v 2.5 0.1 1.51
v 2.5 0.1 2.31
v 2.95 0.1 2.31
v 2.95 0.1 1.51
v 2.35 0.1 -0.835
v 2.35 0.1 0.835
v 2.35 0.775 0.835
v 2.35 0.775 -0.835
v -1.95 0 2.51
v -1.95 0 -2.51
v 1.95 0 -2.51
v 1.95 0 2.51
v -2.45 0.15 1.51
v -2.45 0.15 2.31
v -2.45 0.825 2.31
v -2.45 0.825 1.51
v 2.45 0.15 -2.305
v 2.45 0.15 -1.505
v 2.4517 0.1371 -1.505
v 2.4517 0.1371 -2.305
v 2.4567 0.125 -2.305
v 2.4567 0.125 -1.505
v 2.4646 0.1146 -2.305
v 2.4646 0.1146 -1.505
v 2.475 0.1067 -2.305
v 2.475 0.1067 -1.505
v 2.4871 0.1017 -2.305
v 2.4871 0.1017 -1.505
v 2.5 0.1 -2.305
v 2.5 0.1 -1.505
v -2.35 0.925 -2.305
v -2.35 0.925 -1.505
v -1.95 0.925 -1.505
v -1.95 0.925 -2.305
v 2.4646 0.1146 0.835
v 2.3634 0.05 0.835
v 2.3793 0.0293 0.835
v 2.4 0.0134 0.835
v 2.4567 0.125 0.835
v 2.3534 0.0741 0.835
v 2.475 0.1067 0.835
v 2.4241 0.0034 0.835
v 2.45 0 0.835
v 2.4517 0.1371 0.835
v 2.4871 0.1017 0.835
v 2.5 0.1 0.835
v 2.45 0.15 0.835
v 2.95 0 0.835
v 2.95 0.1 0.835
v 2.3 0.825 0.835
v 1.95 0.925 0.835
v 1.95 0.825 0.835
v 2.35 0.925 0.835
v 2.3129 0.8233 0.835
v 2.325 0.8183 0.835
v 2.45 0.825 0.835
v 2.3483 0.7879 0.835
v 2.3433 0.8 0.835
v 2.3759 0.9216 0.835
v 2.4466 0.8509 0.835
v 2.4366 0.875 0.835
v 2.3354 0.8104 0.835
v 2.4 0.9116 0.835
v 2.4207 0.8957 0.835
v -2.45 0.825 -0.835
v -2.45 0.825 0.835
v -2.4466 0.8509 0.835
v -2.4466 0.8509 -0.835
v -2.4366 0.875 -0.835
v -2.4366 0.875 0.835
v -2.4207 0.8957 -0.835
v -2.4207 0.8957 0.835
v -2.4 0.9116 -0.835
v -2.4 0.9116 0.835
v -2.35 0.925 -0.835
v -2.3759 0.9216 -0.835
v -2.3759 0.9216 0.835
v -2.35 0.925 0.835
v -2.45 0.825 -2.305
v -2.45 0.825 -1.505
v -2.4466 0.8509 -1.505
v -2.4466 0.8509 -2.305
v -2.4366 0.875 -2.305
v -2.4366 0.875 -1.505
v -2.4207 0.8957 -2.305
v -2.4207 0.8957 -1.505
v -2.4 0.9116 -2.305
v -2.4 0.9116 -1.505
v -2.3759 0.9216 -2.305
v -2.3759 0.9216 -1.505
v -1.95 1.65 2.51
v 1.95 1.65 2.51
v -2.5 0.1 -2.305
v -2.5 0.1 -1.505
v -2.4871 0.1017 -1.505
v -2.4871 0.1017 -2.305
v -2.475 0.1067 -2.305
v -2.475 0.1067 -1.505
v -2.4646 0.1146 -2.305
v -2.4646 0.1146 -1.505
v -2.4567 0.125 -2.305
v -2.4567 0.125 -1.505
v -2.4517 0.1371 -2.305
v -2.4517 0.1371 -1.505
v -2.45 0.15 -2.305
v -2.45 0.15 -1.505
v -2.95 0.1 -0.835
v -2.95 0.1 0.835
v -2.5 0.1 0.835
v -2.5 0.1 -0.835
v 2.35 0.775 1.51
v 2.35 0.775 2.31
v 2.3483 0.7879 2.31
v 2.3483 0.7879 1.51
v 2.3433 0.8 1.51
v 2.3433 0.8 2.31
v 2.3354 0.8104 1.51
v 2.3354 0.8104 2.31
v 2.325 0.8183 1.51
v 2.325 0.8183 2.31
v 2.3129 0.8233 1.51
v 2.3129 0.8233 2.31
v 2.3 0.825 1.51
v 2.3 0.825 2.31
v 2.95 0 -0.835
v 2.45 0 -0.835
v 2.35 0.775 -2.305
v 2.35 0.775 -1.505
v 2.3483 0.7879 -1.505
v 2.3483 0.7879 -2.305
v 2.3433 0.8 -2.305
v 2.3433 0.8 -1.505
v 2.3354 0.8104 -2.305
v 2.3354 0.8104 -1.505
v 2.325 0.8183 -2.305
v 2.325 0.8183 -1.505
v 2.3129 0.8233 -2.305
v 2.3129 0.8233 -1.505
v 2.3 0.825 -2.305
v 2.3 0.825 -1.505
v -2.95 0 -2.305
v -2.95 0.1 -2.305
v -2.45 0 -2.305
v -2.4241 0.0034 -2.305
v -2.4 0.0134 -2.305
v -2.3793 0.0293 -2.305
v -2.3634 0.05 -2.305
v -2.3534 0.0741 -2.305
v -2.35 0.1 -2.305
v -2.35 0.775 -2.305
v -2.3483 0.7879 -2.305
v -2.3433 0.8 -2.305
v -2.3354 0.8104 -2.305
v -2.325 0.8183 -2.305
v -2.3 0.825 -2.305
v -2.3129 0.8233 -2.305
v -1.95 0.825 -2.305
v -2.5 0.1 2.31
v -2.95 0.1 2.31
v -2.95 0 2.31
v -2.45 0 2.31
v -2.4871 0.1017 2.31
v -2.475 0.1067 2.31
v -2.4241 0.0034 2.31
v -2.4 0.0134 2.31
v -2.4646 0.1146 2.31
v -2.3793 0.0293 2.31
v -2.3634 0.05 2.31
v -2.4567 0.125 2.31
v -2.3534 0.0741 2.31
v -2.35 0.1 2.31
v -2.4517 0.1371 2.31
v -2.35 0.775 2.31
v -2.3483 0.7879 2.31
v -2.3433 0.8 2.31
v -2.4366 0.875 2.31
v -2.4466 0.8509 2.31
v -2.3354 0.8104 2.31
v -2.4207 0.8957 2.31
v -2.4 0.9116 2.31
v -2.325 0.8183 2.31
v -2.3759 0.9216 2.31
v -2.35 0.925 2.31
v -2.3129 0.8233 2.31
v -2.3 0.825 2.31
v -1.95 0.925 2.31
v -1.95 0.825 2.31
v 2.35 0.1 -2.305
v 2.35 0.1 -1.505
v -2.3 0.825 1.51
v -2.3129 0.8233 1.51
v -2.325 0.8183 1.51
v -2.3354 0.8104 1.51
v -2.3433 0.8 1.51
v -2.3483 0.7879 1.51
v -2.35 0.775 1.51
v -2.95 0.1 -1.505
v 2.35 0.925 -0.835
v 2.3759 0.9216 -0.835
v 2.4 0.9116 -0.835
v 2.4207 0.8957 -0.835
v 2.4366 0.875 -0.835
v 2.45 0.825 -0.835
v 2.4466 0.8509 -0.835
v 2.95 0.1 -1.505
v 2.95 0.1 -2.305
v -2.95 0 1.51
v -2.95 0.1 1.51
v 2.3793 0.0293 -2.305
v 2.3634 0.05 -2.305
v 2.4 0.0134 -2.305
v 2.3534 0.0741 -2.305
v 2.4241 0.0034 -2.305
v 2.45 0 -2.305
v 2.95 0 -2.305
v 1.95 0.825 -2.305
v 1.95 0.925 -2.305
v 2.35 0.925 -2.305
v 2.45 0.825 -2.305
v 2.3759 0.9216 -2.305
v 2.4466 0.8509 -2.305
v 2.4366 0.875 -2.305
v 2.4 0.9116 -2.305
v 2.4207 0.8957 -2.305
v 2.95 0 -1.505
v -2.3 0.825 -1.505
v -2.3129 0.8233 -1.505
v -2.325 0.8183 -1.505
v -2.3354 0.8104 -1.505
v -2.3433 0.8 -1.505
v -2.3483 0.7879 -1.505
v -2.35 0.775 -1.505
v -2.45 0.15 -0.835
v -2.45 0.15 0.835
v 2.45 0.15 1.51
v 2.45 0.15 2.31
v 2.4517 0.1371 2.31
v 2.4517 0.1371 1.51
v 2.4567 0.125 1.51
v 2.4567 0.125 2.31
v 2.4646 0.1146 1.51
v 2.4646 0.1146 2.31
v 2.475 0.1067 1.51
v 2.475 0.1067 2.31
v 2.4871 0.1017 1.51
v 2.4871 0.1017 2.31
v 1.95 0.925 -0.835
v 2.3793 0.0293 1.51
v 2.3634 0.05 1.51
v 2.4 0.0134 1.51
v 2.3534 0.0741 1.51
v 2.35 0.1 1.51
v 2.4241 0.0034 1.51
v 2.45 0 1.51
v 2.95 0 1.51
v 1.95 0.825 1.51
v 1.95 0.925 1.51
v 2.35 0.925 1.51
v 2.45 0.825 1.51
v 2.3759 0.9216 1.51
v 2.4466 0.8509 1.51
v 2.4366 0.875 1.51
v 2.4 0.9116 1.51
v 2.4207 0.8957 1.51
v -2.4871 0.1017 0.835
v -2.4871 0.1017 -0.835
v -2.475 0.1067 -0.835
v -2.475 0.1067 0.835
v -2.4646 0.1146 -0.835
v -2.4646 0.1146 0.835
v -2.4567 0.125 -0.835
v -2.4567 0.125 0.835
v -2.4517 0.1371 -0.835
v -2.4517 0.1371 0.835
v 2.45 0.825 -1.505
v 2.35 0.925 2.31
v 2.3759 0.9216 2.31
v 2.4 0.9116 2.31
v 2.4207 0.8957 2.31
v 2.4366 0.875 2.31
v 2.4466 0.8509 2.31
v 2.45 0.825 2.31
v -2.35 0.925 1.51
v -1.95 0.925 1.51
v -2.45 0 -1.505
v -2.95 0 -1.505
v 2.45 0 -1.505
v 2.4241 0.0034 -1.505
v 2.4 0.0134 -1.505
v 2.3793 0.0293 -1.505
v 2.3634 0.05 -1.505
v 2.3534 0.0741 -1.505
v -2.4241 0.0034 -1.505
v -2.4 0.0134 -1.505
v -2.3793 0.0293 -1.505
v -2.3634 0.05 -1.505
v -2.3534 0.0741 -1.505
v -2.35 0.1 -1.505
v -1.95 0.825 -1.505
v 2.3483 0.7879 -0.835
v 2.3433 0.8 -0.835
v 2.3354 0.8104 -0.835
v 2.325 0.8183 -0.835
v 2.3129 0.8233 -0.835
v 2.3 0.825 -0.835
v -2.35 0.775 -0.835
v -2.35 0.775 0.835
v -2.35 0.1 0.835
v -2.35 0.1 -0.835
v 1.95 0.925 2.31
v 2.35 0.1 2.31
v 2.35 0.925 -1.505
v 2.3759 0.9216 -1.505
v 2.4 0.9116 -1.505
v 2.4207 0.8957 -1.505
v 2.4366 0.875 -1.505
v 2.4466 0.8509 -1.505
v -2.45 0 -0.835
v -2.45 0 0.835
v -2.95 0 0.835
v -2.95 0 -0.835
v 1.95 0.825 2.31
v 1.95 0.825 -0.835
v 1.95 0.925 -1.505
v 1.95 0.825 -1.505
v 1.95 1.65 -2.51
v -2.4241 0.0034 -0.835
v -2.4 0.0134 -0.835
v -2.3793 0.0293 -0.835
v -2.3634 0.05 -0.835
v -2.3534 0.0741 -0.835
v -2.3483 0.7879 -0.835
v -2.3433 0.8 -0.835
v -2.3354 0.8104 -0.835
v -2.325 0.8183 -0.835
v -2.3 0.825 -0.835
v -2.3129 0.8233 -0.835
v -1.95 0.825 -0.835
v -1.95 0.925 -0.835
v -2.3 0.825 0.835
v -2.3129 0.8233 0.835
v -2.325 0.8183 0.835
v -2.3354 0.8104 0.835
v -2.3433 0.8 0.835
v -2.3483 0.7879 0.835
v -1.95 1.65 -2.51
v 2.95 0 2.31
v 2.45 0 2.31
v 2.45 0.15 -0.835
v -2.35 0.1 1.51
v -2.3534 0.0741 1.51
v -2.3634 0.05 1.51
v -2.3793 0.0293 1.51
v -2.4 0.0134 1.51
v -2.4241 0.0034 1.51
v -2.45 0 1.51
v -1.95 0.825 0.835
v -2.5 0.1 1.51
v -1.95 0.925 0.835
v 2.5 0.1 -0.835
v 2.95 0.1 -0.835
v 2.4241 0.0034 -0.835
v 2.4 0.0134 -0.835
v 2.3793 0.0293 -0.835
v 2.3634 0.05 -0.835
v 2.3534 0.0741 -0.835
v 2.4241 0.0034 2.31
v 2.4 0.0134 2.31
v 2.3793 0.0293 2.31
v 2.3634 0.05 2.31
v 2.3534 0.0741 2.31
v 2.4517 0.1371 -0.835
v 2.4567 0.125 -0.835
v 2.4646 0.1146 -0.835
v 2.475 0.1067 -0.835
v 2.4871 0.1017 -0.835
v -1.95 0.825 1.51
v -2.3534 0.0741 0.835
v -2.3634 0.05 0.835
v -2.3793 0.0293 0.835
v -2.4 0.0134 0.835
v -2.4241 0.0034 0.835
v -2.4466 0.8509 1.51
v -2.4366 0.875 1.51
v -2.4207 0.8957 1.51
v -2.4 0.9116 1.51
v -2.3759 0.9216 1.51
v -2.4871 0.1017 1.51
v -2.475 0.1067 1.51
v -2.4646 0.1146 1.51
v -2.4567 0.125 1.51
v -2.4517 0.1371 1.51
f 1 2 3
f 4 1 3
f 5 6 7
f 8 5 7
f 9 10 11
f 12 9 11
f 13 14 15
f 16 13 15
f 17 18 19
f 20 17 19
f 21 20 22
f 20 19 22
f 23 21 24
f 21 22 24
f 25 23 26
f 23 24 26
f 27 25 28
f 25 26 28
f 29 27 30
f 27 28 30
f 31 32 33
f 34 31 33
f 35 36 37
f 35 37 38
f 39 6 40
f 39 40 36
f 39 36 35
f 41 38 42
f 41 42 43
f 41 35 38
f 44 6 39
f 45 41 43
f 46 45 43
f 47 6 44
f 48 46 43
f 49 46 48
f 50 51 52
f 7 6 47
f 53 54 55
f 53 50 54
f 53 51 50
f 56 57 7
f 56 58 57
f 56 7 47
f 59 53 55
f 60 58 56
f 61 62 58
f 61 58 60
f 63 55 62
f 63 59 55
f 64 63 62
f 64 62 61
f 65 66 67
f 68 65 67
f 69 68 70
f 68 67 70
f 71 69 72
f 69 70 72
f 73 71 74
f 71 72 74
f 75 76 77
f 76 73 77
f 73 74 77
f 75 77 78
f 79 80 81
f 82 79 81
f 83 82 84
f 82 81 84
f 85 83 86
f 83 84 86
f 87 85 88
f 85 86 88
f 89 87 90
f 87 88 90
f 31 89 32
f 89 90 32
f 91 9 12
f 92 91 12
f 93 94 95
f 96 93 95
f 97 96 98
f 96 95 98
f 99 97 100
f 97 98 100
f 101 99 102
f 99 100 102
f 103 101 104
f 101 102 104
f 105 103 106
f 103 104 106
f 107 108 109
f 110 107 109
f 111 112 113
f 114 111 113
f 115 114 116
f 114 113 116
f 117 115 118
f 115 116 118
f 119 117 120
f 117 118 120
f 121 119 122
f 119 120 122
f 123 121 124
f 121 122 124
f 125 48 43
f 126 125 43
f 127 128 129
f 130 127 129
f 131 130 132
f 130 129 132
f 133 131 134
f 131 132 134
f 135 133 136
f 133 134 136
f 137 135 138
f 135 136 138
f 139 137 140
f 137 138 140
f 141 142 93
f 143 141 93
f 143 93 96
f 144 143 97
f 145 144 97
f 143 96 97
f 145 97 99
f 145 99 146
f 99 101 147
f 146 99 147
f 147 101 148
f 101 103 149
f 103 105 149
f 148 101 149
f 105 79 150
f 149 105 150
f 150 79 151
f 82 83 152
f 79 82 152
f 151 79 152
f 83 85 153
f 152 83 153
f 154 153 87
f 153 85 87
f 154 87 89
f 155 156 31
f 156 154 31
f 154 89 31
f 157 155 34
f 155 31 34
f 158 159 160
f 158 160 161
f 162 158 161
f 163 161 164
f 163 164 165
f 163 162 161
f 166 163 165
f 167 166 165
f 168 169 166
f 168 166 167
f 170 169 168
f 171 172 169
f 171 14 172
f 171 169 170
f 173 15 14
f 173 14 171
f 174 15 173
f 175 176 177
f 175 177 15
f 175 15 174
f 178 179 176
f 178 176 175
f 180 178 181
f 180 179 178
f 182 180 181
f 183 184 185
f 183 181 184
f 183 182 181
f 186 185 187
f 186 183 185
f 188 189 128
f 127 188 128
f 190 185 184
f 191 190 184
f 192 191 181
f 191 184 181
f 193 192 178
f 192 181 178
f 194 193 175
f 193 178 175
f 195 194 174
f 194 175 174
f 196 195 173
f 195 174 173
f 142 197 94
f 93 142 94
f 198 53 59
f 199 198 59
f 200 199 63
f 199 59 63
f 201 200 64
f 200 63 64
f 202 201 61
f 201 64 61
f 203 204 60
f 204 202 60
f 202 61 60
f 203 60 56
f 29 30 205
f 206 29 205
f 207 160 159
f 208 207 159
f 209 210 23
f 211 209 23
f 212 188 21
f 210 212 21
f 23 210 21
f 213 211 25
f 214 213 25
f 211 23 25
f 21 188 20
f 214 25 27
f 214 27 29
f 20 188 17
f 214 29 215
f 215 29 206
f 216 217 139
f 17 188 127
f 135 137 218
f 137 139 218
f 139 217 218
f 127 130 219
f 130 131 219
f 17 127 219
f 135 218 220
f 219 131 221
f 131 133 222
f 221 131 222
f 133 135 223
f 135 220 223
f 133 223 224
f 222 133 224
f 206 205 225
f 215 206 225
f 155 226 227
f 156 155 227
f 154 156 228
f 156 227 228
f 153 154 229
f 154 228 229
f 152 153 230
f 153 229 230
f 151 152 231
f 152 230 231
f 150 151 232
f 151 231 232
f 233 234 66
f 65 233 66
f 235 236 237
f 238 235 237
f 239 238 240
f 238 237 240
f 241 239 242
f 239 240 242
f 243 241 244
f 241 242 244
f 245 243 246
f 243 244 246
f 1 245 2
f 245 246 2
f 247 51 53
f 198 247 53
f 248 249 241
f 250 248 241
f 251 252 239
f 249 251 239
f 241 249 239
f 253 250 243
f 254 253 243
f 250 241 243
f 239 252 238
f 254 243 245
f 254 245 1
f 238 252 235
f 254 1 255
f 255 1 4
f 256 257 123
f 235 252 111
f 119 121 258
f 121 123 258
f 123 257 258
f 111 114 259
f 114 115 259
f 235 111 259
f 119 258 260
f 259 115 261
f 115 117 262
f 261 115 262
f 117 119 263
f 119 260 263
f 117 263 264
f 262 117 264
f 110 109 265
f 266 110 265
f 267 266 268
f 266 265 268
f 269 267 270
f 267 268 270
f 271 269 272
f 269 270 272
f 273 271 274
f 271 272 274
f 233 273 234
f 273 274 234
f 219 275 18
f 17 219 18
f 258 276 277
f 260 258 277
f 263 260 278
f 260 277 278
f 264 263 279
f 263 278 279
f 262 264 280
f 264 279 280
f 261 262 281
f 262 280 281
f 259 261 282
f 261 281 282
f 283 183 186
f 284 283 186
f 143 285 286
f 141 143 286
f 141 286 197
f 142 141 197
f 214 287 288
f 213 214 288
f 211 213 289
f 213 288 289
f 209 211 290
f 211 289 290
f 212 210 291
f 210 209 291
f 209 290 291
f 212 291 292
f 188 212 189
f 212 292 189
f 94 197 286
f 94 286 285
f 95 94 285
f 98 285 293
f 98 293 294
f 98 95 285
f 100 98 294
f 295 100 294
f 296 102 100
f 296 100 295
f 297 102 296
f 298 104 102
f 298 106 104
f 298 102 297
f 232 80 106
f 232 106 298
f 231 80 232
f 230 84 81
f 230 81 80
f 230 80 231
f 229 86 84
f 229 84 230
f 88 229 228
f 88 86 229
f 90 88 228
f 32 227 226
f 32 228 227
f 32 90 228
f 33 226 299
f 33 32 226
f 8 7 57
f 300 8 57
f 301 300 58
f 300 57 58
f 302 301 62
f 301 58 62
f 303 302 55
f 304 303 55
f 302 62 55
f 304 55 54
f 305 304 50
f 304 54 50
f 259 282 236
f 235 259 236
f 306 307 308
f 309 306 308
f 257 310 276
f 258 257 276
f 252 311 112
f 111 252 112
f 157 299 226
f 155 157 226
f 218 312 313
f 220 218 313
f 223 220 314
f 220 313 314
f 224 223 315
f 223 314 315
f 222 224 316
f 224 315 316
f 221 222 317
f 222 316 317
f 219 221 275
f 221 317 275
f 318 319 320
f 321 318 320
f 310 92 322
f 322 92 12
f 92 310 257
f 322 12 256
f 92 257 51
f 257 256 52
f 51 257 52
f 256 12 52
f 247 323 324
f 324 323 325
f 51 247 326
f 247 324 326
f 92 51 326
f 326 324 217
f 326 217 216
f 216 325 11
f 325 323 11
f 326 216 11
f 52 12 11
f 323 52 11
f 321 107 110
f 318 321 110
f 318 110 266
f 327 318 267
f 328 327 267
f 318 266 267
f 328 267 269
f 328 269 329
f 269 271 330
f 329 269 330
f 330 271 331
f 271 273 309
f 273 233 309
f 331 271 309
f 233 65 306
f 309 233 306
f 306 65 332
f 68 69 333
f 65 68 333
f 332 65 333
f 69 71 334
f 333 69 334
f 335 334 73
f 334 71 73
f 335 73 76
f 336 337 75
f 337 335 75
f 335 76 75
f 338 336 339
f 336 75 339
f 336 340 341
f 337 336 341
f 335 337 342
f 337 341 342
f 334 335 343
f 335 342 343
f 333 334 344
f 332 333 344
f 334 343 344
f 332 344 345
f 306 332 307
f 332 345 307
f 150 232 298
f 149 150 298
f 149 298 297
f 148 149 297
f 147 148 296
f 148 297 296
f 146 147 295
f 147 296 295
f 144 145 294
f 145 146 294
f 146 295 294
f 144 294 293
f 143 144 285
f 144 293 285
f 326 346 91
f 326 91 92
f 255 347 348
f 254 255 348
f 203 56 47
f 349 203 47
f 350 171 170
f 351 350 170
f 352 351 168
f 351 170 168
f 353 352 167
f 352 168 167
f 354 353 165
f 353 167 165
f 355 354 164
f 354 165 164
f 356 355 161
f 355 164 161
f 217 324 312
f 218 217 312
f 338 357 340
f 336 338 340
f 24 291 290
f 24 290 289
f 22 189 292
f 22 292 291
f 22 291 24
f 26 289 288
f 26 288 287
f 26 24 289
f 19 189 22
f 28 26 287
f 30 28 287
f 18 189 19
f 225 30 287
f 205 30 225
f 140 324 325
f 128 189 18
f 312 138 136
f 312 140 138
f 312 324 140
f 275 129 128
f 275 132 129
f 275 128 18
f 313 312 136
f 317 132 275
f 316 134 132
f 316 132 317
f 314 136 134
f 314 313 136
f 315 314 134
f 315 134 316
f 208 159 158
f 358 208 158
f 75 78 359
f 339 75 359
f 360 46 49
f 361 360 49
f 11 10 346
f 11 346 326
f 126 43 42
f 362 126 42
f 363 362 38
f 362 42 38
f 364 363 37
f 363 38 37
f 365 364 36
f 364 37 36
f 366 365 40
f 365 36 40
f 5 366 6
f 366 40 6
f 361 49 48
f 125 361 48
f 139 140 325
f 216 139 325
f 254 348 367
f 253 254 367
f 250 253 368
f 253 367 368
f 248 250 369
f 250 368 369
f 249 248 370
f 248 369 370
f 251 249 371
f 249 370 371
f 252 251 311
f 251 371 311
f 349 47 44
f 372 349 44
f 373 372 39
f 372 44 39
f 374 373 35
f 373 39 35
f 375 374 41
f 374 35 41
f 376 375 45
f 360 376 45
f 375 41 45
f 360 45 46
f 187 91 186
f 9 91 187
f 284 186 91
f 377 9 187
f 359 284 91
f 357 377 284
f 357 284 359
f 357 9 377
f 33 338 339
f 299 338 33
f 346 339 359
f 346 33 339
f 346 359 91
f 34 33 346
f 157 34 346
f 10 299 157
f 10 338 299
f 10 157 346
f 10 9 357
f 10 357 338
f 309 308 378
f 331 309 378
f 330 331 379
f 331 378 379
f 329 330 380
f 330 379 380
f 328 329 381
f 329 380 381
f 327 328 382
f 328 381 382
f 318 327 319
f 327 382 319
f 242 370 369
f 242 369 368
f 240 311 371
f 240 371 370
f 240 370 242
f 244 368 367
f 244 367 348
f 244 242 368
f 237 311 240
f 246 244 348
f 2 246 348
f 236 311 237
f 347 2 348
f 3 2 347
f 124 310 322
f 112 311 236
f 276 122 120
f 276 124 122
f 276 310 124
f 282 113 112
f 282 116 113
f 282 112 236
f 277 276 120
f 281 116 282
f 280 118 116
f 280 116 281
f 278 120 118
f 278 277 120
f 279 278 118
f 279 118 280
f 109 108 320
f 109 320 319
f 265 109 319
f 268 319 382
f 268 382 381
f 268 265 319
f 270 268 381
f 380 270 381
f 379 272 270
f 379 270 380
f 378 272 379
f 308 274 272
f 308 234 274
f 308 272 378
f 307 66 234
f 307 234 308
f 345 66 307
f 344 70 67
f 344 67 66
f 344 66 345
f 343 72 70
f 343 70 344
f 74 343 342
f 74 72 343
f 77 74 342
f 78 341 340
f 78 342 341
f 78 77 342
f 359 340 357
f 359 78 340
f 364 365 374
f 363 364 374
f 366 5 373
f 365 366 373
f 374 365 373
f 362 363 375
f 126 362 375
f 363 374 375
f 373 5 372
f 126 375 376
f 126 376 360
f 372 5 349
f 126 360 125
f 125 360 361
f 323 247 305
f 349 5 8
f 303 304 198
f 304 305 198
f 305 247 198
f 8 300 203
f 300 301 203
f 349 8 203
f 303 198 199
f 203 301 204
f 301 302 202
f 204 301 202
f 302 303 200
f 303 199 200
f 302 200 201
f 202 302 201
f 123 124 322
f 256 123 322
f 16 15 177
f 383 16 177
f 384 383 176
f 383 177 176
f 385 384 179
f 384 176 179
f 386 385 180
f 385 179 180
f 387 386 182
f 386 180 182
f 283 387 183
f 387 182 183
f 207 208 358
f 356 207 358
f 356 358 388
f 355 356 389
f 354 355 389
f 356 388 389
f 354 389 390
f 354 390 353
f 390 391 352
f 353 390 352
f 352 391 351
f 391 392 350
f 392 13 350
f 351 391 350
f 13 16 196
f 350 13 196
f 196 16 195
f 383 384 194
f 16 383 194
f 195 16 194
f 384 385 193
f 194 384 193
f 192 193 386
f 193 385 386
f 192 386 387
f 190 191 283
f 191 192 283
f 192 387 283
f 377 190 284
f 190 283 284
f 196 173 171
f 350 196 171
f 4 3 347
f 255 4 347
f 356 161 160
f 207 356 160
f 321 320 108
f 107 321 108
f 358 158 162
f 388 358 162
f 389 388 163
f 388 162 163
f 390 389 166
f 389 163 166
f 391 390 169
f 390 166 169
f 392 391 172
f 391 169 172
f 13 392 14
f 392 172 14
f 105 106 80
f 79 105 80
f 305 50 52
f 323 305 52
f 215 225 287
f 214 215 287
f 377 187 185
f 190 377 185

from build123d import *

# Parameters (mm, degrees)
SKETCH1_W           = 3.9
SKETCH1_H           = 5.02
BOSS_EXTRUDE1_DEPTH = 1.65
BOSS_EXTRUDE2_DEPTH = 5.02
SKETCH3_W           = 1
SKETCH3_H           = 0.205
SKETCH3_H_2         = 0.67
SKETCH3_H_3         = 0.675
SKETCH3_H_4         = 0.2
CUT_EXTRUDE1_DEPTH  = 5.210118763


with BuildPart() as part:
    # Sketch1 → Boss-Extrude1 (new body)
    with BuildSketch(Plane(origin=(0, 0, 0), x_dir=(1, 0, 0), z_dir=(0, 1, 0))):
        Rectangle(SKETCH1_W, SKETCH1_H)
    extrude(amount=BOSS_EXTRUDE1_DEPTH)

    # Sketch2 → Boss-Extrude2 (add)
    with BuildSketch(Plane.XY.offset(2.51)):
        with BuildLine():
            Line((2.95, 0), (2.45, 0))
            ThreePointArc((2.45, 0), (2.379289322, 0.029289322), (2.35, 0.1))
            Line((2.35, 0.1), (2.35, 0.775))
            ThreePointArc((2.35, 0.775), (2.335355339, 0.810355339), (2.3, 0.825))
            Line((2.3, 0.825), (1.95, 0.825))
            Line((1.95, 0.825), (1.95, 0.925))
            Line((1.95, 0.925), (2.35, 0.925))
            ThreePointArc((2.35, 0.925), (2.420710678, 0.895710678), (2.45, 0.825))
            Line((2.45, 0.825), (2.45, 0.15))
            ThreePointArc((2.45, 0.15), (2.464644661, 0.114644661), (2.5, 0.1))
            Line((2.5, 0.1), (2.95, 0.1))
            Line((2.95, 0.1), (2.95, 0))
        make_face()
        with BuildLine():
            Line((-1.95, 0.925), (-1.95, 0.825))
            Line((-1.95, 0.825), (-2.3, 0.825))
            ThreePointArc((-2.3, 0.825), (-2.335355339, 0.810355339), (-2.35, 0.775))
            Line((-2.35, 0.775), (-2.35, 0.1))
            ThreePointArc((-2.35, 0.1), (-2.379289322, 0.029289322), (-2.45, 0))
            Line((-2.45, 0), (-2.95, 0))
            Line((-2.95, 0), (-2.95, 0.1))
            Line((-2.95, 0.1), (-2.5, 0.1))
            ThreePointArc((-2.5, 0.1), (-2.464644661, 0.114644661), (-2.45, 0.15))
            Line((-2.45, 0.15), (-2.45, 0.825))
            ThreePointArc((-2.45, 0.825), (-2.420710678, 0.895710678), (-2.35, 0.925))
            Line((-2.35, 0.925), (-1.95, 0.925))
        make_face()
    extrude(amount=-BOSS_EXTRUDE2_DEPTH)

    # Sketch3 → Cut-Extrude1 (cut, through all)
    with BuildSketch(Plane(origin=(0, 1.65, 0), x_dir=(1, 0, 0), z_dir=(0, 1, 0))):
        with Locations((-2.45, 2.4075)):
            Rectangle(SKETCH3_W, SKETCH3_H)
        with Locations((2.45, 2.4075)):
            Rectangle(SKETCH3_W, SKETCH3_H)
        with Locations((-2.45, 1.17)):
            Rectangle(SKETCH3_W, SKETCH3_H_2)
        with Locations((2.45, 1.17)):
            Rectangle(SKETCH3_W, SKETCH3_H_2)
        with Locations((-2.45, -1.1725)):
            Rectangle(SKETCH3_W, SKETCH3_H_3)
        with Locations((2.45, -1.1725)):
            Rectangle(SKETCH3_W, SKETCH3_H_3)
        with Locations((2.45, -2.41)):
            Rectangle(SKETCH3_W, SKETCH3_H_4)
        with Locations((-2.45, -2.41)):
            Rectangle(SKETCH3_W, SKETCH3_H_4)
    extrude(amount=-CUT_EXTRUDE1_DEPTH, mode=Mode.SUBTRACT)


solid = part.part
